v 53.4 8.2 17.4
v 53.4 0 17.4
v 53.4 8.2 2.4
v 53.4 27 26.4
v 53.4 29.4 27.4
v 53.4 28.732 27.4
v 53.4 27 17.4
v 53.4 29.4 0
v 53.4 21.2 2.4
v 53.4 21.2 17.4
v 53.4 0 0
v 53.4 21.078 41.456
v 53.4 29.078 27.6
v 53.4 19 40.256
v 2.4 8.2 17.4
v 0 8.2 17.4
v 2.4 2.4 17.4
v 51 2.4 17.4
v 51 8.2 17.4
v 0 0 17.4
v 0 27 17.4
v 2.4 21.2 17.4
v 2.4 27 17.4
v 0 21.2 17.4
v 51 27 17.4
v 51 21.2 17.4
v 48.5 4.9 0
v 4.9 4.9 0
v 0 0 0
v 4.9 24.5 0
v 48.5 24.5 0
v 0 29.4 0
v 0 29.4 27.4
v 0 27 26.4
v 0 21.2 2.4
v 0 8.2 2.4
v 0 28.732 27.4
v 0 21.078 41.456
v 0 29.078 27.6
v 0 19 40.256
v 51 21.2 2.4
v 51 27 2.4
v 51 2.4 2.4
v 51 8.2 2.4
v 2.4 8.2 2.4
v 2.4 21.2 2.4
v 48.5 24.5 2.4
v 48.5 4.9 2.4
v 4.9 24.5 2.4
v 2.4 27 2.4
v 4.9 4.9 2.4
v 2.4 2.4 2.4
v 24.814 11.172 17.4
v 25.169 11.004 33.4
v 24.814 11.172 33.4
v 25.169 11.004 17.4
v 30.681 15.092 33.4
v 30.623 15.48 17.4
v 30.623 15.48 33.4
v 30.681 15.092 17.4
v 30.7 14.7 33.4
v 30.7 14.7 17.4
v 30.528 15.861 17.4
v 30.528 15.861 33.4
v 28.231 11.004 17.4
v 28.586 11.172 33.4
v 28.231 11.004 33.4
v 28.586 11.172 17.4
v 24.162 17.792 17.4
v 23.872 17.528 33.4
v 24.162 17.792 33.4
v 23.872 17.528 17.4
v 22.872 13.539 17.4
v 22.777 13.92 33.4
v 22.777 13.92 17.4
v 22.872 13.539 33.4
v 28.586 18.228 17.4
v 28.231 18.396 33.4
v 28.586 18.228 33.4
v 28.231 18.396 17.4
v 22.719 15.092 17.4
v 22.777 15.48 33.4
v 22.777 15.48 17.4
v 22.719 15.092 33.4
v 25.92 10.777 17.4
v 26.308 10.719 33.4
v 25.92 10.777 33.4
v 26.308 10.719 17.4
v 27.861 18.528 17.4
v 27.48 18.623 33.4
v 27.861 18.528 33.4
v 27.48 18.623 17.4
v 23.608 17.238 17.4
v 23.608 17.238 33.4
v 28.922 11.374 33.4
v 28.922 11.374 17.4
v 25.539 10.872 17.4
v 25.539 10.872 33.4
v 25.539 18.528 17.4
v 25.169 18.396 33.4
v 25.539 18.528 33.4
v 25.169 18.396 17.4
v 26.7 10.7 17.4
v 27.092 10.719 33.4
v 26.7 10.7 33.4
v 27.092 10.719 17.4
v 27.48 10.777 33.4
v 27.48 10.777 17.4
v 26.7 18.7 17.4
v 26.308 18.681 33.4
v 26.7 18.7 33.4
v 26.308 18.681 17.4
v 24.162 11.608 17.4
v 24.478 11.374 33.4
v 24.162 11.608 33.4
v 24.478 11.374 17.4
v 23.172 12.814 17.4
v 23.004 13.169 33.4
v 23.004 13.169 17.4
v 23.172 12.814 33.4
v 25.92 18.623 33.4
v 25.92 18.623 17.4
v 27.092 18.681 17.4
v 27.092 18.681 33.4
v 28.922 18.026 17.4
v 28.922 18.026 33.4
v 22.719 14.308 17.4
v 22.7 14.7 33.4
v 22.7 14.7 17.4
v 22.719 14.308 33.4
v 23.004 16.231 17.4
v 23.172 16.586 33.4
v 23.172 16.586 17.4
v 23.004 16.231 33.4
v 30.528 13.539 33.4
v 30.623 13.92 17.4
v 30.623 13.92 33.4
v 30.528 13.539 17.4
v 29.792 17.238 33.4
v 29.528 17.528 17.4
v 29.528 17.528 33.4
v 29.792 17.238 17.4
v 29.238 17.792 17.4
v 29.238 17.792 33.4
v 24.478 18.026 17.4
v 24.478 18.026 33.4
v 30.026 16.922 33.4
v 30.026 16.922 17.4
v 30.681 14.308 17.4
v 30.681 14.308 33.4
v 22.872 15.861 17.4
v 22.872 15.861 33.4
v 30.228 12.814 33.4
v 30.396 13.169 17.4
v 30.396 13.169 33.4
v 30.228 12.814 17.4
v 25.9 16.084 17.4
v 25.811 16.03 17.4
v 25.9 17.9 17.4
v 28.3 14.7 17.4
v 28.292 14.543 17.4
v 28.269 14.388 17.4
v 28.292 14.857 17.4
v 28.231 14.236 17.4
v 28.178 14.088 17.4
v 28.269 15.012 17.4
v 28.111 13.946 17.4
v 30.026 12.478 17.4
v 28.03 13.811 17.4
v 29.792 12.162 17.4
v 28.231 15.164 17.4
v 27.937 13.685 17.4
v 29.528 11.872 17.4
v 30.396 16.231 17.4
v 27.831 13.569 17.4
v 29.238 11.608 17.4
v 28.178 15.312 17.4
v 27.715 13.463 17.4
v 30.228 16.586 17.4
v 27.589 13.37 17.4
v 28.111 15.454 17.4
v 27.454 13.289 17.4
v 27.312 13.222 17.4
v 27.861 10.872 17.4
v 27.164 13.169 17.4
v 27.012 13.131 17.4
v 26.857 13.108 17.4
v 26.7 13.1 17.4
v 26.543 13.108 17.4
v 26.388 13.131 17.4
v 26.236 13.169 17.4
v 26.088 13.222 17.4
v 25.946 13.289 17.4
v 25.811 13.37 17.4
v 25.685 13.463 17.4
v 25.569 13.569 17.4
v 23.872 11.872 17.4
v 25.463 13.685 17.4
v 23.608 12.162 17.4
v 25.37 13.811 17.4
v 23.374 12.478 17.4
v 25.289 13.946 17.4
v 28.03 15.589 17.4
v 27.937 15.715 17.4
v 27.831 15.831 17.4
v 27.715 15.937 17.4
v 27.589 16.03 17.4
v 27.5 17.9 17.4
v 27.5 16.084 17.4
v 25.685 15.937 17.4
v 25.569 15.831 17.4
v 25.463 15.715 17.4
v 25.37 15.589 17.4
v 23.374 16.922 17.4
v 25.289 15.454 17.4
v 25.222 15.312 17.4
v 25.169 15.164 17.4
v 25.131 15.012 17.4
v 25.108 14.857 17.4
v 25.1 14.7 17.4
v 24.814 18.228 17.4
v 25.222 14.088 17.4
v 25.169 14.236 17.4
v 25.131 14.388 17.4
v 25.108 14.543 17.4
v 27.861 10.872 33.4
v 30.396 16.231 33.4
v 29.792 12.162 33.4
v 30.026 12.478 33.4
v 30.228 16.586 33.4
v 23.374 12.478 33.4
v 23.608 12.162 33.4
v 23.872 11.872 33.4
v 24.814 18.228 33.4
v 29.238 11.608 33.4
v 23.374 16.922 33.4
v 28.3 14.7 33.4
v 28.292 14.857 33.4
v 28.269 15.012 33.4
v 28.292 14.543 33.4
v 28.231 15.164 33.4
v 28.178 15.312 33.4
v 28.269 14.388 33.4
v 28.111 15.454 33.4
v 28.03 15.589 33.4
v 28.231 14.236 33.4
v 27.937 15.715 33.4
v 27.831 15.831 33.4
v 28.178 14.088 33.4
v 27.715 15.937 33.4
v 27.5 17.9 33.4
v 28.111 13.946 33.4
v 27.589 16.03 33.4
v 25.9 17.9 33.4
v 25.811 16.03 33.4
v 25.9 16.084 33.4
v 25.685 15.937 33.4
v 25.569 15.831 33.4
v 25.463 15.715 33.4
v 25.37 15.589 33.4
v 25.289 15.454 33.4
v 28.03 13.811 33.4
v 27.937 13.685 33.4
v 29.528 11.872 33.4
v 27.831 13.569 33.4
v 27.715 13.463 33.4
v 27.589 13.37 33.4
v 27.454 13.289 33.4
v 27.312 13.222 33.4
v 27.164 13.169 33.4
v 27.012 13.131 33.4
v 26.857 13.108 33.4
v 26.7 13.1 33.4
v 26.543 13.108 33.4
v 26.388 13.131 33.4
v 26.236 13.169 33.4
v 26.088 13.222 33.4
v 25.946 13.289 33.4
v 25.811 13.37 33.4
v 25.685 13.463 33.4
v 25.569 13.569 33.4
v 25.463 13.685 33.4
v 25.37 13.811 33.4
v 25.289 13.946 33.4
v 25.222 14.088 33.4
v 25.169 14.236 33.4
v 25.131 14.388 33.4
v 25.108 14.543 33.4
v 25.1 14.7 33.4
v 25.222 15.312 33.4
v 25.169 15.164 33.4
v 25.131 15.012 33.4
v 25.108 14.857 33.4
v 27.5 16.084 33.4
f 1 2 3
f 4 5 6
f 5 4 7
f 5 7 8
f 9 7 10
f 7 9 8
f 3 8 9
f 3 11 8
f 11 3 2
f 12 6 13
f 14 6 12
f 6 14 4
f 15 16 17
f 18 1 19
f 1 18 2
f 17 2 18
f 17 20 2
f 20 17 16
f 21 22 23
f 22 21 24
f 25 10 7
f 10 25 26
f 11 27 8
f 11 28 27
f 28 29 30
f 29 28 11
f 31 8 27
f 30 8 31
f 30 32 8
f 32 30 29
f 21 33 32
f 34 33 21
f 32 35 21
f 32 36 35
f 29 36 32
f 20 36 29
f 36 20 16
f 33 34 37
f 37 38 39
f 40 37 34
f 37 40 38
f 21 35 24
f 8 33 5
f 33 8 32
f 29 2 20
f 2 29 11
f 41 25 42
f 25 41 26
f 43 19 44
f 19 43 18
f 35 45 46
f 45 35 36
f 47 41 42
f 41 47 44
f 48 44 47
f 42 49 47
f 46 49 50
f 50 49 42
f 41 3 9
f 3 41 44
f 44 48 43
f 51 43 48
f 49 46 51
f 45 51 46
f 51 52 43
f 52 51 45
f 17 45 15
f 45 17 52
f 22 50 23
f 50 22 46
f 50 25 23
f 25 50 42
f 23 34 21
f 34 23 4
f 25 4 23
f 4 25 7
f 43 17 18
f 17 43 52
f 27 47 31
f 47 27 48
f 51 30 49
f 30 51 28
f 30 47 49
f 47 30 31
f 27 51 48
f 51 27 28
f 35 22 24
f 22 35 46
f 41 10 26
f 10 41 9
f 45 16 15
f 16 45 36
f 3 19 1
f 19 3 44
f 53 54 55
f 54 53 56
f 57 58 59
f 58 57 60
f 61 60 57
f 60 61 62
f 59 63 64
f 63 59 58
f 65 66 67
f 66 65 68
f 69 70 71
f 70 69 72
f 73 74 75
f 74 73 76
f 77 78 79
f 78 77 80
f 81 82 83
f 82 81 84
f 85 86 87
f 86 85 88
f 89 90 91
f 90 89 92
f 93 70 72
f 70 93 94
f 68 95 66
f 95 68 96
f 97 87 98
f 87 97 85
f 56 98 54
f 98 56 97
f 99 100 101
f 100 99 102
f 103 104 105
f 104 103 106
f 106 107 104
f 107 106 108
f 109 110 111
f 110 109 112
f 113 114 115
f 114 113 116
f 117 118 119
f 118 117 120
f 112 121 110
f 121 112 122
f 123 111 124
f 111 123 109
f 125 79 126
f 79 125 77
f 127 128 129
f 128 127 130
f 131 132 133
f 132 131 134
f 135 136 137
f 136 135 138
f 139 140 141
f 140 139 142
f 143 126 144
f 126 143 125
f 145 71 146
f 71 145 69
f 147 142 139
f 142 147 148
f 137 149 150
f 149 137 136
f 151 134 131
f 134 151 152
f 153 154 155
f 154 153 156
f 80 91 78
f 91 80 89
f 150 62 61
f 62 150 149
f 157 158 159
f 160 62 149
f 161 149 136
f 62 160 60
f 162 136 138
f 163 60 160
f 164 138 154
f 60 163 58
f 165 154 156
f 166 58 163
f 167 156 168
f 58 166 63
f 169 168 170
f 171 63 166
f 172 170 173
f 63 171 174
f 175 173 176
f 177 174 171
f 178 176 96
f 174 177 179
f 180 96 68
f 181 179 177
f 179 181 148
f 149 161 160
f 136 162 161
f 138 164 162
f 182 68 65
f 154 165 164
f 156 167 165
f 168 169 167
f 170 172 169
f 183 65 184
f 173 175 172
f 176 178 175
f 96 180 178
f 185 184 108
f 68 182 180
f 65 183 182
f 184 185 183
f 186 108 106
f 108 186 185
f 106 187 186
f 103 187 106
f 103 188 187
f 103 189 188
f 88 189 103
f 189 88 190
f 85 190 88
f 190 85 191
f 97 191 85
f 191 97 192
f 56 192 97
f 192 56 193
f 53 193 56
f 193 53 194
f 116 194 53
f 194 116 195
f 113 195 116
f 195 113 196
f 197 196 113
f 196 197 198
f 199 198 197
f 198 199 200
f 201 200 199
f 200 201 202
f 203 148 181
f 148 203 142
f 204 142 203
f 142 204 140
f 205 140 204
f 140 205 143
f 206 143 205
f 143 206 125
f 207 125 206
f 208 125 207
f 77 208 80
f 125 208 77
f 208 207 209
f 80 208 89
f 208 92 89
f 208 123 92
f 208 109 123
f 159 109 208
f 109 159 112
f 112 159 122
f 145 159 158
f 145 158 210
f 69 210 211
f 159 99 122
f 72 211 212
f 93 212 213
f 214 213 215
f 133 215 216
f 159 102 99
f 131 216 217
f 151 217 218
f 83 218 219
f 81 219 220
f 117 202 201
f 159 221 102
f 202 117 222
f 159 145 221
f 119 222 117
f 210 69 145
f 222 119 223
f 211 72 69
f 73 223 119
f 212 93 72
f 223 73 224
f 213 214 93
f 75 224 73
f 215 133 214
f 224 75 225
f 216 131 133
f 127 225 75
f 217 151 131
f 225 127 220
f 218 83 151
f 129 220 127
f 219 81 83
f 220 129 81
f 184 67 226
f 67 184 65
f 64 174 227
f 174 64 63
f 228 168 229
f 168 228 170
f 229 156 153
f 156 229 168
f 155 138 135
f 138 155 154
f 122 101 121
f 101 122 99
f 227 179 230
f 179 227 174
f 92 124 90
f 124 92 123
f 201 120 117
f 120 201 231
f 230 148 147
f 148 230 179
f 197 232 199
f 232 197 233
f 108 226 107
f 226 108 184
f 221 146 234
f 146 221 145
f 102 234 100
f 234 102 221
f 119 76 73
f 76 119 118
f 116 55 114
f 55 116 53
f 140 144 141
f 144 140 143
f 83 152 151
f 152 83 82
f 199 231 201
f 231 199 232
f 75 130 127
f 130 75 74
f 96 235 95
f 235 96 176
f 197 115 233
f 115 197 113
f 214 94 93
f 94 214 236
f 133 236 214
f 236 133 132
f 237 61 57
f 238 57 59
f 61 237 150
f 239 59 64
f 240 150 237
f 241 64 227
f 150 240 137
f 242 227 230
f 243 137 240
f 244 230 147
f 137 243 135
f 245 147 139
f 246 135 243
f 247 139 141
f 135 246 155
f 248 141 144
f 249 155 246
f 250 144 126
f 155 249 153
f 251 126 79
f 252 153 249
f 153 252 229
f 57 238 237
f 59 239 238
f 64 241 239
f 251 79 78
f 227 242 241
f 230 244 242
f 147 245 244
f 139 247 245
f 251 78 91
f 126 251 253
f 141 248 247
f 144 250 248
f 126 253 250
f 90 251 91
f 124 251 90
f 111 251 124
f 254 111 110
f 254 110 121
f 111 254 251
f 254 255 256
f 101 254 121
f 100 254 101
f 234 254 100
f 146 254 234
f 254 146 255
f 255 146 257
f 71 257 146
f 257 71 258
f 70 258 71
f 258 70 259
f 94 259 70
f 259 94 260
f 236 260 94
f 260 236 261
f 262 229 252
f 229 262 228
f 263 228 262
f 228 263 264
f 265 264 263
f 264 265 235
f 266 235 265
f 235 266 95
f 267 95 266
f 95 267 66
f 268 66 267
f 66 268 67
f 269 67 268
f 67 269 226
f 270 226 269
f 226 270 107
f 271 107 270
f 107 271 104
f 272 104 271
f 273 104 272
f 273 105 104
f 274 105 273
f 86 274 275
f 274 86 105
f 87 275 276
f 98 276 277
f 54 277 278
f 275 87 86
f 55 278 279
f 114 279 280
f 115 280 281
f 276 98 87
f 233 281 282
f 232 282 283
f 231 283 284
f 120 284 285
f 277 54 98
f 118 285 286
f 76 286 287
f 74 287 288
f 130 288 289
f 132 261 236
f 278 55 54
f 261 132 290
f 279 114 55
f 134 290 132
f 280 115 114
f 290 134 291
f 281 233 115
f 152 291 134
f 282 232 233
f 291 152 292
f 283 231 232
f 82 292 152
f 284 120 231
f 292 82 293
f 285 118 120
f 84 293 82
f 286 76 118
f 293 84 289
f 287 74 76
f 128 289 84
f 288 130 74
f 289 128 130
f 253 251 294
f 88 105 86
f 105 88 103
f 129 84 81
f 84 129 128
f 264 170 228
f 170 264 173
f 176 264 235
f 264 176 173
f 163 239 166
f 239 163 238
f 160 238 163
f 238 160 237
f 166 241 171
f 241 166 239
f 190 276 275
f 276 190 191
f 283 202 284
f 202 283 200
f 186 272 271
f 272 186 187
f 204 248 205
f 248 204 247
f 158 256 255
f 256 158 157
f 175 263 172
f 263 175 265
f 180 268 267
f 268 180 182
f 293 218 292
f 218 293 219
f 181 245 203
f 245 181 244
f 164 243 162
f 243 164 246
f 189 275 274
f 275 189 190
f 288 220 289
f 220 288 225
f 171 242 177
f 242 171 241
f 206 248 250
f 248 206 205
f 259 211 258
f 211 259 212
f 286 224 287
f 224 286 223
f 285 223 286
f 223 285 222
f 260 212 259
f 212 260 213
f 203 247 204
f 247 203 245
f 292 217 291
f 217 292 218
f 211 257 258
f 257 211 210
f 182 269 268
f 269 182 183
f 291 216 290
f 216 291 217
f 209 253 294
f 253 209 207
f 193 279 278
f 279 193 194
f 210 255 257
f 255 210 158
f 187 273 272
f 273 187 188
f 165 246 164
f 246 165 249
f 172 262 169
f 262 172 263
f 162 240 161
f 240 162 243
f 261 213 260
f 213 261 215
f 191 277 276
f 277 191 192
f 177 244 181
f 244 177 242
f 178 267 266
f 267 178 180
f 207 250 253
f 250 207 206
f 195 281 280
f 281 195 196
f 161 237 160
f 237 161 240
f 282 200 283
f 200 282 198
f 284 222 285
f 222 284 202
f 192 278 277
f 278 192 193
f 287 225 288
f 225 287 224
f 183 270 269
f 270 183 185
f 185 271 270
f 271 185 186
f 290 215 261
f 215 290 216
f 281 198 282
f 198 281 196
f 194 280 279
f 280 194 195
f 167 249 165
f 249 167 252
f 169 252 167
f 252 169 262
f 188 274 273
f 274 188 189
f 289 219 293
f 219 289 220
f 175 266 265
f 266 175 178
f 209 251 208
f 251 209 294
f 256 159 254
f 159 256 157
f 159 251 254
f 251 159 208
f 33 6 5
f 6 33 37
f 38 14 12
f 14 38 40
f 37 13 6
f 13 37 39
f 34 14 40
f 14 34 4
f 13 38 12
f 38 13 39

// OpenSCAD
// ============================================================================
//  Helmet HUD mount — Bell Super Air
//  Two printed parts joined by a BENDABLE ALUMINIUM WIRE (the boom).
//    • bracket  → shares the visor pivot screw (no drilling)
//    • cradle   → holds 2x M5 Puzzle 8x8 + a sun hood
//  The wire = adjustable position AND breakaway (bends/pulls out in a crash).
//
//  Usage:  open in OpenSCAD → set the MEASURE params → set `part` →
//          F5 preview, F6 render, export STL.  Print each part separately.
//
//  Print:  PETG (sun/heat resistant + tough; PLA gets brittle/soft outdoors),
//          0.2 mm layer, 4 perimeters, 30% infill, brim on.  Bambu Studio: use
//          the Generic PETG profile.  No supports needed (parts print flat).
// ============================================================================

part = "cradle";          // "bracket"  or  "cradle"  (export one at a time)

/* ---------- MEASURE THESE (caliper) ---------- */
visor_screw_d = 4.0;      // Bell visor pivot screw shaft diameter
wire_d        = 3.2;      // your bendable boom wire diameter + ~0.2 clearance

/* ---------- panel = 2x M5 Puzzle 8x8 (24x24x15 each) ---------- */
panel_w = 48.6;           // 2 x 24 + tolerance
panel_h = 24.6;
panel_t = 15.0;
lip     = 2.5;            // front retaining lip (holds panel, LEDs show through)
grove_w = 13;             // side openings for the Grove cables

wall = 2.4;
$fn  = 64;

// friction tube that grips the bendable wire (flex slit lets it pinch)
module wire_tube(len = 18){
  difference(){
    cylinder(d = wire_d + 2*wall, h = len);
    translate([0,0,-1]) cylinder(d = wire_d, h = len + 2);
    translate([-wire_d/4, 0, -1]) cube([wire_d/2, wire_d, len + 2]);   // slit
  }
}

/* Part A — visor-pivot bracket */
module bracket(){
  pl = 22; arm = 16; t = 4;
  difference(){
    union(){
      hull(){
        cylinder(d = pl, h = t);
        translate([arm,0,0]) cylinder(d = 11, h = t);
      }
      translate([arm,0,t]) rotate([0,90,0]) wire_tube(18);   // boom socket
    }
    translate([0,0,-1]) cylinder(d = visor_screw_d, h = t + 2);        // screw hole
    translate([0,0,t-1.8]) cylinder(d = visor_screw_d + 3.5, h = 2);   // head recess
  }
}

/* Part B — Puzzle cradle + sun hood + boom socket */
module cradle(){
  ow = panel_w + 2*wall; oh = panel_h + 2*wall; d = panel_t + wall;
  difference(){
    cube([ow, oh, d]);
    translate([wall, wall, wall]) cube([panel_w, panel_h, d]);                 // pocket (open back)
    translate([wall+lip, wall+lip, -1]) cube([panel_w-2*lip, panel_h-2*lip, wall+2]); // window
    translate([-1, oh/2 - grove_w/2, wall]) cube([ow+2, grove_w, d]);          // grove slots
  }
  // sun hood over the top edge (shades the LEDs, kills glare)
  translate([0, oh - wall, 0]) cube([ow, wall, d + 10]);
  translate([0, oh - wall, d + 9]) rotate([30,0,0]) cube([ow, wall, 16]);
  // boom socket on the back, centered
  translate([ow/2, oh/2, d]) wire_tube(16);
}

if (part == "bracket") bracket();
else                    cradle();
